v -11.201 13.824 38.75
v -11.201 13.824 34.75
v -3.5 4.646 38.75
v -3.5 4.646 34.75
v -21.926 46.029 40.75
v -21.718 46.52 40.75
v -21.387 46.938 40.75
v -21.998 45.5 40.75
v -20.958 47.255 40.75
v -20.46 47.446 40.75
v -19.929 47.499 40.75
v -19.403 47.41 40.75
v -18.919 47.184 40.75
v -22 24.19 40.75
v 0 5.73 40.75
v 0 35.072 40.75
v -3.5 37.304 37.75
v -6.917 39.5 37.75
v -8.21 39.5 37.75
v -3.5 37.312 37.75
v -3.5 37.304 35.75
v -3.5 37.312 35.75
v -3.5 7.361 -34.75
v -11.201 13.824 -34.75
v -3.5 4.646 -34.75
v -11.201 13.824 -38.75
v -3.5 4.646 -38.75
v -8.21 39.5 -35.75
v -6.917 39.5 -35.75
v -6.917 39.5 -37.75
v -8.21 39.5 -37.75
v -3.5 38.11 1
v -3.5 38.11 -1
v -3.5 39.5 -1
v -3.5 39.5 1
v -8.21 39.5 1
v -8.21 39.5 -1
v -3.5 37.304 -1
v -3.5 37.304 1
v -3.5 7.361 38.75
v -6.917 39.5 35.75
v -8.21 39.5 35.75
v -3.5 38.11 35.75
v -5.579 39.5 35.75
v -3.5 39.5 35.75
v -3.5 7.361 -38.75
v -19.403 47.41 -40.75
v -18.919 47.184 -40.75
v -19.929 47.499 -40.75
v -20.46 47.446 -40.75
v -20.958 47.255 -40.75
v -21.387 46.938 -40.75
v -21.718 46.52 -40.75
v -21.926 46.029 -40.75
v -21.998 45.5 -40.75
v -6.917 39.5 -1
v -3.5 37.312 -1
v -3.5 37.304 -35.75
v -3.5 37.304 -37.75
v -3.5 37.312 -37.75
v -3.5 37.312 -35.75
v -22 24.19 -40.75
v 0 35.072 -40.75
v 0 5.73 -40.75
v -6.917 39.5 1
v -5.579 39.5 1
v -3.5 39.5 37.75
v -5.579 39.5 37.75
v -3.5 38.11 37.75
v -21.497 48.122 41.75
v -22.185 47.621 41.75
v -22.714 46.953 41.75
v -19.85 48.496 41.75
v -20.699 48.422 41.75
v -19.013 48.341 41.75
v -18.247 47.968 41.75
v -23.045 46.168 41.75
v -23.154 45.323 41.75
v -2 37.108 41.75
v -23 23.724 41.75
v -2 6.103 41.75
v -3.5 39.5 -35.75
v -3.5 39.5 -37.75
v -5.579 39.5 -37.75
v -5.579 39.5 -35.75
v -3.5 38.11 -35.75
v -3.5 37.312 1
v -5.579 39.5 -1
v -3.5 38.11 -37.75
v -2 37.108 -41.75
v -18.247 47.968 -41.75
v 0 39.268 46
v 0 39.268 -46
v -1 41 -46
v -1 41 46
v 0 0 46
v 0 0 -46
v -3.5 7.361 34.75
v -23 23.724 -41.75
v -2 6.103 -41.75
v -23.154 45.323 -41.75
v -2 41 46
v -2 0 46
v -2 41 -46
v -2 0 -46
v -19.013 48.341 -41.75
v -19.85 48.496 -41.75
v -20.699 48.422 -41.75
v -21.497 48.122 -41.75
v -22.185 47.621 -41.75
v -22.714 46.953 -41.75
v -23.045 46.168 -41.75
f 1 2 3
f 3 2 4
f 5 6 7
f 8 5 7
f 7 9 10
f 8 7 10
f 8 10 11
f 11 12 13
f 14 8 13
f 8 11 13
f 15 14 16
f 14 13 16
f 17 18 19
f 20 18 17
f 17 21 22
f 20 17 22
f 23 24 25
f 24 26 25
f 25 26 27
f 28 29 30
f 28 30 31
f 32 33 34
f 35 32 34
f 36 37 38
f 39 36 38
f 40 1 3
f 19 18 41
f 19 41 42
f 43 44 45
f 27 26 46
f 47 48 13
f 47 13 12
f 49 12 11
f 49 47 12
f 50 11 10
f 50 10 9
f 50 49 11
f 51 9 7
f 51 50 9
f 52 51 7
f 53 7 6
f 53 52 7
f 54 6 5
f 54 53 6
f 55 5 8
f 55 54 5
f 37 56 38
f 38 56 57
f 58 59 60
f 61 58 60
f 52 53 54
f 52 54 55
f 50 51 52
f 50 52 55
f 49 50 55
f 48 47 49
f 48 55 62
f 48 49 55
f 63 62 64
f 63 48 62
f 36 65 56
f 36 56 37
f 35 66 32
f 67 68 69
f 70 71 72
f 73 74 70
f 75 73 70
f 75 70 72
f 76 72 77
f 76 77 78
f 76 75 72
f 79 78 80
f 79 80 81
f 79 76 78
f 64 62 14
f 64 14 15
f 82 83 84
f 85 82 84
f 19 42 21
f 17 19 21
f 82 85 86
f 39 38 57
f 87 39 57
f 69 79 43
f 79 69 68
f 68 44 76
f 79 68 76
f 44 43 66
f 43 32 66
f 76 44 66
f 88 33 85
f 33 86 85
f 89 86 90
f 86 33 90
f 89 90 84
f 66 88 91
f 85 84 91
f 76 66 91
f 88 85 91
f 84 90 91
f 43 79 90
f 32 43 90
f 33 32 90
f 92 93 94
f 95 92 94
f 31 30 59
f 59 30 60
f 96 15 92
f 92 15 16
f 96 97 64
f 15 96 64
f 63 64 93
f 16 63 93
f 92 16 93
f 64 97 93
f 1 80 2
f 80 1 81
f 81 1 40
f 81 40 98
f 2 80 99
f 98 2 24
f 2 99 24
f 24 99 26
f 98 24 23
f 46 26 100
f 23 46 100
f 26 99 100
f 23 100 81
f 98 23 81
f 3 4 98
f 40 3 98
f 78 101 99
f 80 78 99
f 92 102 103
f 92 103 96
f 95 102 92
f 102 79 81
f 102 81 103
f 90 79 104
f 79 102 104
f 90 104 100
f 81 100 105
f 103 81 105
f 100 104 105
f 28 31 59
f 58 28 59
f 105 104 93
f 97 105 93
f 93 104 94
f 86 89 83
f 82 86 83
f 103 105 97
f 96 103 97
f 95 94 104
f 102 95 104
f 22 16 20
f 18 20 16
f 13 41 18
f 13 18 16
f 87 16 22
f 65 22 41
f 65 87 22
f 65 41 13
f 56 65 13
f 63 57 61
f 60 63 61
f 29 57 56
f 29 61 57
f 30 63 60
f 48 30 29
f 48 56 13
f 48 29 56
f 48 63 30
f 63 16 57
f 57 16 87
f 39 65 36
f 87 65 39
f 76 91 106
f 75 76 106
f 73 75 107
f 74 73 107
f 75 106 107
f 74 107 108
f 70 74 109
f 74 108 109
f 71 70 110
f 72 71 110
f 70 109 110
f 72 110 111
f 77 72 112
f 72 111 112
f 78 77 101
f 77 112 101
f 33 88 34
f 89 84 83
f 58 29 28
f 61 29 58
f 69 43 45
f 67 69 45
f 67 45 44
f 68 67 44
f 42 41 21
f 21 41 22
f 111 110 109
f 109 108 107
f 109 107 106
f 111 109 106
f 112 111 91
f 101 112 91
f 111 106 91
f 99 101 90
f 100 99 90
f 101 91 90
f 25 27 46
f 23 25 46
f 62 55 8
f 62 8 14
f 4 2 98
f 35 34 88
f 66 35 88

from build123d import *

# Parameters (mm, degrees)
EXTRUDE_1_DEPTH          = 46
EXTRUDE_1_DEPTH_BACK     = 46
EXTRUDE_2_DEPTH          = 41.75
EXTRUDE_2_DEPTH_BACK     = 41.75
CUT_EXTRUDE_1_DEPTH      = 40.75
CUT_EXTRUDE_1_DEPTH_BACK = 40.75
EXTRUDE_3_DEPTH          = 1
EXTRUDE_3_DEPTH_BACK     = 1
EXTRUDE_4_DEPTH          = 1
EXTRUDE_4_DEPTH_BACK     = 1
EXTRUDE_5_DEPTH          = 1
EXTRUDE_5_DEPTH_BACK     = 1
EXTRUDE_6_DEPTH          = 2
EXTRUDE_6_DEPTH_BACK     = 2
EXTRUDE_7_DEPTH          = 2
EXTRUDE_7_DEPTH_BACK     = 2


with BuildPart() as part:
    # 草图1 → 凸台-拉伸1 (new, two sides: drawn at the far end of the back side and taken through both)
    with BuildSketch(Plane.XY.offset(-EXTRUDE_1_DEPTH_BACK)):
        Polygon((-2, 41), (-2, 0), (0, 0), (0, 39.267949192), (-1, 41), align=None)
    extrude(amount=EXTRUDE_1_DEPTH + EXTRUDE_1_DEPTH_BACK)

    # 草图2 → 凸台-拉伸2 (add, two sides: drawn at the far end of the back side and taken through both)
    with BuildSketch(Plane.XY.offset(-EXTRUDE_2_DEPTH_BACK)):
        with BuildLine():
            Line((-23.15444772, 45.322915161), (-23, 23.723915946))
            Line((-23, 23.723915946), (-2, 6.102823691))
            Line((-2, 6.102823691), (-2, 37.107539179))
            Line((-2, 37.107539179), (-18.24692063, 47.968020382))
            ThreePointArc((-18.24692063, 47.968020382), (-21.496697605, 48.122330559), (-23.15444772, 45.322915161))
        make_face()
    extrude(amount=EXTRUDE_2_DEPTH + EXTRUDE_2_DEPTH_BACK)

    # 草图3 → 切除-拉伸1 (cut, two sides: drawn at the far end of the back side and taken through both)
    with BuildSketch(Plane.XY.offset(-CUT_EXTRUDE_1_DEPTH_BACK)):
        with BuildLine():
            Line((-22, 24.190223604), (0, 5.730031718))
            Line((0, 5.730031718), (0, 35.071545943))
            Line((0, 35.071545943), (-18.919301008, 47.184362345))
            ThreePointArc((-18.919301008, 47.184362345), (-20.957600798, 47.254585951), (-21.9976903, 45.500216772))
            Line((-21.9976903, 45.500216772), (-22, 24.190223604))
        make_face()
    extrude(amount=CUT_EXTRUDE_1_DEPTH + CUT_EXTRUDE_1_DEPTH_BACK, mode=Mode.SUBTRACT)

    # 草图4 → 凸台-拉伸3 (add, two sides: drawn at the far end of the back side and taken through both)
    with BuildSketch(Plane.XY.offset(-EXTRUDE_3_DEPTH_BACK)):
        Polygon((-8.210146219, 39.5), (-3.5, 37.303622747), (-3.5, 39.5), align=None)
    extrude(amount=EXTRUDE_3_DEPTH + EXTRUDE_3_DEPTH_BACK)

    # 草图6 → 凸台-拉伸4 (add, two sides: drawn at the far end of the back side and taken through both)
    with BuildSketch(Plane.XY.offset(-36.75).offset(-EXTRUDE_4_DEPTH_BACK)):
        Polygon((-8.210146219, 39.5), (-3.5, 37.303622747), (-3.5, 39.5), align=None)
    extrude(amount=EXTRUDE_4_DEPTH + EXTRUDE_4_DEPTH_BACK)

    # 草图5 → 凸台-拉伸5 (add, two sides: drawn at the far end of the back side and taken through both)
    with BuildSketch(Plane.XY.offset(36.75).offset(-EXTRUDE_5_DEPTH_BACK)):
        Polygon((-8.210146219, 39.5), (-3.5, 37.303622747), (-3.5, 39.5), align=None)
    extrude(amount=EXTRUDE_5_DEPTH + EXTRUDE_5_DEPTH_BACK)

    # 草图7 → 凸台-拉伸6 (add, two sides: drawn at the far end of the back side and taken through both)
    with BuildSketch(Plane.XY.offset(-36.75).offset(-EXTRUDE_6_DEPTH_BACK)):
        Polygon((-13.201666314, 16.207545053), (-3.5, 4.645549369), (-3.5, 8.066880427), align=None)
    extrude(amount=EXTRUDE_6_DEPTH + EXTRUDE_6_DEPTH_BACK)

    # 草图8 → 凸台-拉伸7 (add, two sides: drawn at the far end of the back side and taken through both)
    with BuildSketch(Plane.XY.offset(36.75).offset(-EXTRUDE_7_DEPTH_BACK)):
        Polygon((-13.201666314, 16.207545053), (-3.5, 4.645549369), (-3.5, 8.066880427), align=None)
    extrude(amount=EXTRUDE_7_DEPTH + EXTRUDE_7_DEPTH_BACK)


solid = part.part
